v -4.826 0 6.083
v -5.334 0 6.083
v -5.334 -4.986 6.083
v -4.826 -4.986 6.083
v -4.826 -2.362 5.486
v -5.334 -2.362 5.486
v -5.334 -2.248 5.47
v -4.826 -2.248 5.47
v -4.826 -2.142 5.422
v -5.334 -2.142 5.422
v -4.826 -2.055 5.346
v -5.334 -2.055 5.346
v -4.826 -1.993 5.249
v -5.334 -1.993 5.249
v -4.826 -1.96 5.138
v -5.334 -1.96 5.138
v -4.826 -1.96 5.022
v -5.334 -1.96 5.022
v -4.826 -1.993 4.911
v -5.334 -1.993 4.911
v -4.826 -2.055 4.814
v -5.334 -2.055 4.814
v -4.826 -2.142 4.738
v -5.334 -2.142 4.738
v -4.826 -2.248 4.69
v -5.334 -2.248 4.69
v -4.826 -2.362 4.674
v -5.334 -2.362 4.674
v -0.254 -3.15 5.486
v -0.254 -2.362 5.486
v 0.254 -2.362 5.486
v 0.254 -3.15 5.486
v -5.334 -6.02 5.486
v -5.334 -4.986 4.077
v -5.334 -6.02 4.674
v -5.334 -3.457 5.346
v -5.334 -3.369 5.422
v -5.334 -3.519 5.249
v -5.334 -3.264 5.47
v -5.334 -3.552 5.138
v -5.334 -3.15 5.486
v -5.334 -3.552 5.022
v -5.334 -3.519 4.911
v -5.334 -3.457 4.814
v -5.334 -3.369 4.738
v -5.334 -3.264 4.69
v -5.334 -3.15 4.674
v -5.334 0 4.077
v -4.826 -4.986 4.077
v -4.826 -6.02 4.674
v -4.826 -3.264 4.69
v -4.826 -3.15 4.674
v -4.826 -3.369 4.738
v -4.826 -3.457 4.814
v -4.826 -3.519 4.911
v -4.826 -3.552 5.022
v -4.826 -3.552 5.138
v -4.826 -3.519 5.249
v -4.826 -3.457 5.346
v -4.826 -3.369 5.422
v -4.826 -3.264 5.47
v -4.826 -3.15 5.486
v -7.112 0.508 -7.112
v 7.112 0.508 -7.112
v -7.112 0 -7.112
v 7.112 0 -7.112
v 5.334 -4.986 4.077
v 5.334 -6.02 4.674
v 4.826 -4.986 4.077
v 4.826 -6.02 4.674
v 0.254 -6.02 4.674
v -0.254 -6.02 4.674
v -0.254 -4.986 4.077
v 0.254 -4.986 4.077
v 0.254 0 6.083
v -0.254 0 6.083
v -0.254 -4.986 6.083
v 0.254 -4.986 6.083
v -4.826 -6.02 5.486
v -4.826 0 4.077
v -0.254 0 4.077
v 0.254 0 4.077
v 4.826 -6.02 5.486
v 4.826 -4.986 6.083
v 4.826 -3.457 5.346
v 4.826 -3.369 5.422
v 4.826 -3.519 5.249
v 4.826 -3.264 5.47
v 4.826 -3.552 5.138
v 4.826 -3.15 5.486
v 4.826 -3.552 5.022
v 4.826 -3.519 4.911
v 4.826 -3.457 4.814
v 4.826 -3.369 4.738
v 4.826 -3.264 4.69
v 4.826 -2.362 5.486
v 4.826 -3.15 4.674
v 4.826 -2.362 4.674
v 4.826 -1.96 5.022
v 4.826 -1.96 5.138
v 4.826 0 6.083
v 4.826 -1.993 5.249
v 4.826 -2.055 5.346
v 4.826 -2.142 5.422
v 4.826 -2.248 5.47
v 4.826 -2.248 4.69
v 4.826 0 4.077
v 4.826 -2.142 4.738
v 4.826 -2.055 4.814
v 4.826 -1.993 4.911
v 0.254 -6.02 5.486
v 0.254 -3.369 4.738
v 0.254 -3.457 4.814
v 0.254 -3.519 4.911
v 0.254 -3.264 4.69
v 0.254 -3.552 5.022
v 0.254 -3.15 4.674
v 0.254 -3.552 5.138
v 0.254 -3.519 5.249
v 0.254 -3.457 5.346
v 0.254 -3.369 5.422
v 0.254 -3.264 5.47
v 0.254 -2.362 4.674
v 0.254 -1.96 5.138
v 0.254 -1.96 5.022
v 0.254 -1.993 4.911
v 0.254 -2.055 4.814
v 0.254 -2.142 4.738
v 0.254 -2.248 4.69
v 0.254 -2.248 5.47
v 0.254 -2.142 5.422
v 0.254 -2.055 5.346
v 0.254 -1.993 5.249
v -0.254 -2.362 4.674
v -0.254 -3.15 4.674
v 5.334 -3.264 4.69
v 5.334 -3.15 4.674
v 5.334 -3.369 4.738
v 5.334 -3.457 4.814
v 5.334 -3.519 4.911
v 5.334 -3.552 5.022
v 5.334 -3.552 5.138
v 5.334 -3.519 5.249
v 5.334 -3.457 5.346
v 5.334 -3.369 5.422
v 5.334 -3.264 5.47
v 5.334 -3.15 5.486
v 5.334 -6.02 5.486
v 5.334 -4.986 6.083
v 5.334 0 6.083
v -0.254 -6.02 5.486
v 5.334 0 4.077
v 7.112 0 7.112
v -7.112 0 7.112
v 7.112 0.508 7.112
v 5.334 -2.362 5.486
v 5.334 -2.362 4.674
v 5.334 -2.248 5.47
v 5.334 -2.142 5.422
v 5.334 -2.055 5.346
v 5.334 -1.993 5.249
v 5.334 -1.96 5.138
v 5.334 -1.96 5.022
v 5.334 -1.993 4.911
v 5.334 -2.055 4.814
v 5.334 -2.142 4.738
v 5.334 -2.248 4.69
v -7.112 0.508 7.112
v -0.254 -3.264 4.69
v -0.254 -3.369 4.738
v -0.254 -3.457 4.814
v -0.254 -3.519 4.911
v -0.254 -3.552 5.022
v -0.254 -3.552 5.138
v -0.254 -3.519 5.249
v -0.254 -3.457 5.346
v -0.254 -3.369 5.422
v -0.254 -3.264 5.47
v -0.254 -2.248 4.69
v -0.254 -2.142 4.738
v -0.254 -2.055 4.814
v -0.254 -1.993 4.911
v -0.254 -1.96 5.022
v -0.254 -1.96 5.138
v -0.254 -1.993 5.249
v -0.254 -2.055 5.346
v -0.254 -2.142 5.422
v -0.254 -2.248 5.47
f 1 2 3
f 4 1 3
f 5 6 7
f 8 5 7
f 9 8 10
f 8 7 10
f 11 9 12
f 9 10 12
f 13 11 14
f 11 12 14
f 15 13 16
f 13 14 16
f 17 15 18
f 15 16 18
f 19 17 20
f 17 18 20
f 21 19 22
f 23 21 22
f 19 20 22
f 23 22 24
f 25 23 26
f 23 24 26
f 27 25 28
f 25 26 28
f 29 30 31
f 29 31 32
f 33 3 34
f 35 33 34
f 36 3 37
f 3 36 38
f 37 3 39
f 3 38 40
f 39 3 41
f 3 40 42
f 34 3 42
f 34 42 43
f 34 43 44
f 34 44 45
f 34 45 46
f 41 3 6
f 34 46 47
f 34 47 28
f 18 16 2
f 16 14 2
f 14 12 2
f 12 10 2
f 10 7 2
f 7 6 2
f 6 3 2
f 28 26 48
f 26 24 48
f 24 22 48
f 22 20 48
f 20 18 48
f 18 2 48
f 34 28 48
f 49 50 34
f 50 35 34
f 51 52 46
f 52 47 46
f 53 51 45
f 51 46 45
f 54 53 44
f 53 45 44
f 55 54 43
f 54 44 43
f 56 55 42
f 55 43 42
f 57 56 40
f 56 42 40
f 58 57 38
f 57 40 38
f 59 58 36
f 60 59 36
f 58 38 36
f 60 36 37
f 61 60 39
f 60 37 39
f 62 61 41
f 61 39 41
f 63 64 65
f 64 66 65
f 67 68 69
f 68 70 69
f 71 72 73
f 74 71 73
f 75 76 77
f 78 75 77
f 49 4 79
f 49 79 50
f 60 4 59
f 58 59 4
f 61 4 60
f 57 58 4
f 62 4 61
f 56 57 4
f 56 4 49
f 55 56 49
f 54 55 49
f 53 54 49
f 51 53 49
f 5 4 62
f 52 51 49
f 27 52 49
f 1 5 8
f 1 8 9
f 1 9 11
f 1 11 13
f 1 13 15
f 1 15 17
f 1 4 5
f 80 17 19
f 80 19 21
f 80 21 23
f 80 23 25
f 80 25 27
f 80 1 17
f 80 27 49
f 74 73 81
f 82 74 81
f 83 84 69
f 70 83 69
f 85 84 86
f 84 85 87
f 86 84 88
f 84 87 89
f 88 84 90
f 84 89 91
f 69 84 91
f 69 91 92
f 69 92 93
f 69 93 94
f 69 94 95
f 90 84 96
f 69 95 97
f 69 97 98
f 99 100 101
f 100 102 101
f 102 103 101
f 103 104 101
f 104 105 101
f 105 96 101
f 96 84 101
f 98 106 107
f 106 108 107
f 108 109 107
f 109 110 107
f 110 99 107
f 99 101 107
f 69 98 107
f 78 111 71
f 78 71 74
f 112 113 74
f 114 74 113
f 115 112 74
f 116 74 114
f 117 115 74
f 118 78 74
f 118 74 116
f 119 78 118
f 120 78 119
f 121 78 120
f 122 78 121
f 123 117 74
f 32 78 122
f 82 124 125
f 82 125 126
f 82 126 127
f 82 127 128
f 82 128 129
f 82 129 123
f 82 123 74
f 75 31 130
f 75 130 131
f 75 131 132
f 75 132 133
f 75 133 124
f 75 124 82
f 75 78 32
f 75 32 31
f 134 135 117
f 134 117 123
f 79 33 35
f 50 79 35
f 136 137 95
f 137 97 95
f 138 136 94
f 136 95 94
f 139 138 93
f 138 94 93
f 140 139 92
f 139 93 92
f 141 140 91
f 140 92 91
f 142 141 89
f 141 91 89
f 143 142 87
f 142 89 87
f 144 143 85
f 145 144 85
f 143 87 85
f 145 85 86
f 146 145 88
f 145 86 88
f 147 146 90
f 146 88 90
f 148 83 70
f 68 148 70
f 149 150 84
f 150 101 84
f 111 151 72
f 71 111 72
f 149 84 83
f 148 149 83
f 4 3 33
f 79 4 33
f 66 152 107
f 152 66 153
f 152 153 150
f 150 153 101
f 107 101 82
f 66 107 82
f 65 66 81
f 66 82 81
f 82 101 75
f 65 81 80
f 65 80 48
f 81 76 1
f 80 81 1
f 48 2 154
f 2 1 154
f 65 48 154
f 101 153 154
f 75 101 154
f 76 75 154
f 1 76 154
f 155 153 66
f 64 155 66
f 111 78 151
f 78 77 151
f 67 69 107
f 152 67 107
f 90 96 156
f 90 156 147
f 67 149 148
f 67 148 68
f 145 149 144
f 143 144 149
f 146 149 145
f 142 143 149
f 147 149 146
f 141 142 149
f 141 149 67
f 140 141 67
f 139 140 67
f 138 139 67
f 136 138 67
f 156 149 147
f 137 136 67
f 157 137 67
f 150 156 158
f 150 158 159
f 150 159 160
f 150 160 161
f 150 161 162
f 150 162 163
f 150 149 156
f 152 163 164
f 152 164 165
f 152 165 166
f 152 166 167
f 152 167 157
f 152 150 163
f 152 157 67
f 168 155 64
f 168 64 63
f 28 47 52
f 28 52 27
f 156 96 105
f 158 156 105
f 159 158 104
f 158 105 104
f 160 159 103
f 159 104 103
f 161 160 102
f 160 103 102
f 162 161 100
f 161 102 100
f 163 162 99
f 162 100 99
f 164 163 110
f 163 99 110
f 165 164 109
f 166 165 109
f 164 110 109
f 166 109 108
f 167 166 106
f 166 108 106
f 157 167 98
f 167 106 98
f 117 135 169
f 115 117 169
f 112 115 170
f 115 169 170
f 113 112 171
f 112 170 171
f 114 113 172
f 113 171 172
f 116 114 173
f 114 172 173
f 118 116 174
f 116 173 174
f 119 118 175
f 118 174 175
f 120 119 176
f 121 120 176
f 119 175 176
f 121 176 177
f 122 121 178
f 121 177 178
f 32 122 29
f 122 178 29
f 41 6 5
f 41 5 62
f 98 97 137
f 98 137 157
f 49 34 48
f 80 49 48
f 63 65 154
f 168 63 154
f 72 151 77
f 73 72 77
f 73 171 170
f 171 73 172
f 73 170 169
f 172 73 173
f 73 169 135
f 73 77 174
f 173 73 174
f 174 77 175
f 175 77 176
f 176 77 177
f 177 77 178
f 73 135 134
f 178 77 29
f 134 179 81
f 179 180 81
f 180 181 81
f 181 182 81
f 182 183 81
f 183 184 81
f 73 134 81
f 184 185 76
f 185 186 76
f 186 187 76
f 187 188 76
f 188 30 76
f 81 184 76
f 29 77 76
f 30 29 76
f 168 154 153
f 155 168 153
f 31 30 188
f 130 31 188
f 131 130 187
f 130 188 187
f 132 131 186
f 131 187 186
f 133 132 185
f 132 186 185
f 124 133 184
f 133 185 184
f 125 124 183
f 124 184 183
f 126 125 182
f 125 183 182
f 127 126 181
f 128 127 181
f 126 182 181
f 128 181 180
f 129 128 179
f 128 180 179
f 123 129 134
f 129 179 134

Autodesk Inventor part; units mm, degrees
sketch "Sketch_1" plane through (0, 0, 0) normal (0, 1, 0) x (-1, 0, 0)
  line L0 (7.112, -7.112) -> (7.112, 7.112)
  line L1 (7.112, 7.112) -> (-7.112, 7.112)
  line L2 (-7.112, 7.112) -> (-7.112, -7.112)
  line L3 (-7.112, -7.112) -> (7.112, -7.112)
extrude "Extrusion1" add sketch "Sketch_1" along normal blind 0.508
sketch "Sketch_2" plane through (-5.08, 0, 0) normal (1, 0, 0) x (0, 0, -1)
  line L0 (-6.0833, -4.9859) -> (-5.4864, -6.0198)
  line L1 (-5.4864, -6.0198) -> (-4.6736, -6.0198)
  line L2 (-4.6736, -6.0198) -> (-4.0767, -4.9859)
  line L3 (-4.0767, -4.9859) -> (-4.0767, 0.508)
  line L4 (-4.0767, 0.508) -> (-6.0833, 0.508)
  line L5 (-6.0833, 0.508) -> (-6.0833, -4.9859)
  line L6 (-5.4864, -2.3622) -> (-5.4864, -3.1496)
  arc A0 (-5.4864, -3.1496) -> (-5.08, -3.556) centre (-5.08, -3.1496) ccw
  arc A1 (-5.08, -3.556) -> (-4.6736, -3.1496) centre (-5.08, -3.1496) ccw
  line L7 (-4.6736, -3.1496) -> (-4.6736, -2.3622)
  arc A2 (-4.6736, -2.3622) -> (-5.08, -1.9558) centre (-5.08, -2.3622) ccw
  arc A3 (-5.08, -1.9558) -> (-5.4864, -2.3622) centre (-5.08, -2.3622) ccw
extrude "Extrusion2" add sketch "Sketch_2" along normal mid plane 0.508
sketch "Sketch_4" plane through (0, 0, 0) normal (1, 0, 0) x (0, 1, 0)
  line L0 (-4.9859, 6.0833) -> (-6.0198, 5.4864)
  line L1 (-6.0198, 5.4864) -> (-6.0198, 4.6736)
  line L2 (-6.0198, 4.6736) -> (-4.9859, 4.0767)
  line L3 (-4.9859, 4.0767) -> (0.508, 4.0767)
  line L4 (0.508, 4.0767) -> (0.508, 6.0833)
  line L5 (0.508, 6.0833) -> (-4.9859, 6.0833)
  line L6 (-2.3622, 5.4864) -> (-3.1496, 5.4864)
  arc A0 (-3.1496, 5.4864) -> (-3.556, 5.08) centre (-3.1496, 5.08) ccw
  arc A1 (-3.556, 5.08) -> (-3.1496, 4.6736) centre (-3.1496, 5.08) ccw
  line L7 (-3.1496, 4.6736) -> (-2.3622, 4.6736)
  arc A2 (-2.3622, 4.6736) -> (-1.9558, 5.08) centre (-2.3622, 5.08) ccw
  arc A3 (-1.9558, 5.08) -> (-2.3622, 5.4864) centre (-2.3622, 5.08) ccw
extrude "Extrusion3" add sketch "Sketch_4" along normal mid plane 0.508
sketch "Sketch_6" plane through (5.08, 0, 0) normal (1, 0, 0) x (0, 0, -1)
  line L0 (-6.0833, -4.9859) -> (-5.4864, -6.0198)
  line L1 (-5.4864, -6.0198) -> (-4.6736, -6.0198)
  line L2 (-4.6736, -6.0198) -> (-4.0767, -4.9859)
  line L3 (-4.0767, -4.9859) -> (-4.0767, 0.508)
  line L4 (-4.0767, 0.508) -> (-6.0833, 0.508)
  line L5 (-6.0833, 0.508) -> (-6.0833, -4.9859)
  line L6 (-5.4864, -2.3622) -> (-5.4864, -3.1496)
  arc A0 (-5.4864, -3.1496) -> (-5.08, -3.556) centre (-5.08, -3.1496) ccw
  arc A1 (-5.08, -3.556) -> (-4.6736, -3.1496) centre (-5.08, -3.1496) ccw
  line L7 (-4.6736, -3.1496) -> (-4.6736, -2.3622)
  arc A2 (-4.6736, -2.3622) -> (-5.08, -1.9558) centre (-5.08, -2.3622) ccw
  arc A3 (-5.08, -1.9558) -> (-5.4864, -2.3622) centre (-5.08, -2.3622) ccw
extrude "Extrusion4" add sketch "Sketch_6" along normal mid plane 0.508
ref_plane "pole_to_body_XY" through (0, 0.508, 0) normal (0, 1, 0) x (1, 0, 0)
ref_plane "pole_to_body_YZ" through (0, 0.508, 0) normal (1, 0, 0) x (0, 0, -1)
ref_plane "pole_to_body_ZX" through (0, 0.508, 0) normal (0, 0, -1) x (0, 1, 0)
properties part number "UB216KKW015C-NR"
